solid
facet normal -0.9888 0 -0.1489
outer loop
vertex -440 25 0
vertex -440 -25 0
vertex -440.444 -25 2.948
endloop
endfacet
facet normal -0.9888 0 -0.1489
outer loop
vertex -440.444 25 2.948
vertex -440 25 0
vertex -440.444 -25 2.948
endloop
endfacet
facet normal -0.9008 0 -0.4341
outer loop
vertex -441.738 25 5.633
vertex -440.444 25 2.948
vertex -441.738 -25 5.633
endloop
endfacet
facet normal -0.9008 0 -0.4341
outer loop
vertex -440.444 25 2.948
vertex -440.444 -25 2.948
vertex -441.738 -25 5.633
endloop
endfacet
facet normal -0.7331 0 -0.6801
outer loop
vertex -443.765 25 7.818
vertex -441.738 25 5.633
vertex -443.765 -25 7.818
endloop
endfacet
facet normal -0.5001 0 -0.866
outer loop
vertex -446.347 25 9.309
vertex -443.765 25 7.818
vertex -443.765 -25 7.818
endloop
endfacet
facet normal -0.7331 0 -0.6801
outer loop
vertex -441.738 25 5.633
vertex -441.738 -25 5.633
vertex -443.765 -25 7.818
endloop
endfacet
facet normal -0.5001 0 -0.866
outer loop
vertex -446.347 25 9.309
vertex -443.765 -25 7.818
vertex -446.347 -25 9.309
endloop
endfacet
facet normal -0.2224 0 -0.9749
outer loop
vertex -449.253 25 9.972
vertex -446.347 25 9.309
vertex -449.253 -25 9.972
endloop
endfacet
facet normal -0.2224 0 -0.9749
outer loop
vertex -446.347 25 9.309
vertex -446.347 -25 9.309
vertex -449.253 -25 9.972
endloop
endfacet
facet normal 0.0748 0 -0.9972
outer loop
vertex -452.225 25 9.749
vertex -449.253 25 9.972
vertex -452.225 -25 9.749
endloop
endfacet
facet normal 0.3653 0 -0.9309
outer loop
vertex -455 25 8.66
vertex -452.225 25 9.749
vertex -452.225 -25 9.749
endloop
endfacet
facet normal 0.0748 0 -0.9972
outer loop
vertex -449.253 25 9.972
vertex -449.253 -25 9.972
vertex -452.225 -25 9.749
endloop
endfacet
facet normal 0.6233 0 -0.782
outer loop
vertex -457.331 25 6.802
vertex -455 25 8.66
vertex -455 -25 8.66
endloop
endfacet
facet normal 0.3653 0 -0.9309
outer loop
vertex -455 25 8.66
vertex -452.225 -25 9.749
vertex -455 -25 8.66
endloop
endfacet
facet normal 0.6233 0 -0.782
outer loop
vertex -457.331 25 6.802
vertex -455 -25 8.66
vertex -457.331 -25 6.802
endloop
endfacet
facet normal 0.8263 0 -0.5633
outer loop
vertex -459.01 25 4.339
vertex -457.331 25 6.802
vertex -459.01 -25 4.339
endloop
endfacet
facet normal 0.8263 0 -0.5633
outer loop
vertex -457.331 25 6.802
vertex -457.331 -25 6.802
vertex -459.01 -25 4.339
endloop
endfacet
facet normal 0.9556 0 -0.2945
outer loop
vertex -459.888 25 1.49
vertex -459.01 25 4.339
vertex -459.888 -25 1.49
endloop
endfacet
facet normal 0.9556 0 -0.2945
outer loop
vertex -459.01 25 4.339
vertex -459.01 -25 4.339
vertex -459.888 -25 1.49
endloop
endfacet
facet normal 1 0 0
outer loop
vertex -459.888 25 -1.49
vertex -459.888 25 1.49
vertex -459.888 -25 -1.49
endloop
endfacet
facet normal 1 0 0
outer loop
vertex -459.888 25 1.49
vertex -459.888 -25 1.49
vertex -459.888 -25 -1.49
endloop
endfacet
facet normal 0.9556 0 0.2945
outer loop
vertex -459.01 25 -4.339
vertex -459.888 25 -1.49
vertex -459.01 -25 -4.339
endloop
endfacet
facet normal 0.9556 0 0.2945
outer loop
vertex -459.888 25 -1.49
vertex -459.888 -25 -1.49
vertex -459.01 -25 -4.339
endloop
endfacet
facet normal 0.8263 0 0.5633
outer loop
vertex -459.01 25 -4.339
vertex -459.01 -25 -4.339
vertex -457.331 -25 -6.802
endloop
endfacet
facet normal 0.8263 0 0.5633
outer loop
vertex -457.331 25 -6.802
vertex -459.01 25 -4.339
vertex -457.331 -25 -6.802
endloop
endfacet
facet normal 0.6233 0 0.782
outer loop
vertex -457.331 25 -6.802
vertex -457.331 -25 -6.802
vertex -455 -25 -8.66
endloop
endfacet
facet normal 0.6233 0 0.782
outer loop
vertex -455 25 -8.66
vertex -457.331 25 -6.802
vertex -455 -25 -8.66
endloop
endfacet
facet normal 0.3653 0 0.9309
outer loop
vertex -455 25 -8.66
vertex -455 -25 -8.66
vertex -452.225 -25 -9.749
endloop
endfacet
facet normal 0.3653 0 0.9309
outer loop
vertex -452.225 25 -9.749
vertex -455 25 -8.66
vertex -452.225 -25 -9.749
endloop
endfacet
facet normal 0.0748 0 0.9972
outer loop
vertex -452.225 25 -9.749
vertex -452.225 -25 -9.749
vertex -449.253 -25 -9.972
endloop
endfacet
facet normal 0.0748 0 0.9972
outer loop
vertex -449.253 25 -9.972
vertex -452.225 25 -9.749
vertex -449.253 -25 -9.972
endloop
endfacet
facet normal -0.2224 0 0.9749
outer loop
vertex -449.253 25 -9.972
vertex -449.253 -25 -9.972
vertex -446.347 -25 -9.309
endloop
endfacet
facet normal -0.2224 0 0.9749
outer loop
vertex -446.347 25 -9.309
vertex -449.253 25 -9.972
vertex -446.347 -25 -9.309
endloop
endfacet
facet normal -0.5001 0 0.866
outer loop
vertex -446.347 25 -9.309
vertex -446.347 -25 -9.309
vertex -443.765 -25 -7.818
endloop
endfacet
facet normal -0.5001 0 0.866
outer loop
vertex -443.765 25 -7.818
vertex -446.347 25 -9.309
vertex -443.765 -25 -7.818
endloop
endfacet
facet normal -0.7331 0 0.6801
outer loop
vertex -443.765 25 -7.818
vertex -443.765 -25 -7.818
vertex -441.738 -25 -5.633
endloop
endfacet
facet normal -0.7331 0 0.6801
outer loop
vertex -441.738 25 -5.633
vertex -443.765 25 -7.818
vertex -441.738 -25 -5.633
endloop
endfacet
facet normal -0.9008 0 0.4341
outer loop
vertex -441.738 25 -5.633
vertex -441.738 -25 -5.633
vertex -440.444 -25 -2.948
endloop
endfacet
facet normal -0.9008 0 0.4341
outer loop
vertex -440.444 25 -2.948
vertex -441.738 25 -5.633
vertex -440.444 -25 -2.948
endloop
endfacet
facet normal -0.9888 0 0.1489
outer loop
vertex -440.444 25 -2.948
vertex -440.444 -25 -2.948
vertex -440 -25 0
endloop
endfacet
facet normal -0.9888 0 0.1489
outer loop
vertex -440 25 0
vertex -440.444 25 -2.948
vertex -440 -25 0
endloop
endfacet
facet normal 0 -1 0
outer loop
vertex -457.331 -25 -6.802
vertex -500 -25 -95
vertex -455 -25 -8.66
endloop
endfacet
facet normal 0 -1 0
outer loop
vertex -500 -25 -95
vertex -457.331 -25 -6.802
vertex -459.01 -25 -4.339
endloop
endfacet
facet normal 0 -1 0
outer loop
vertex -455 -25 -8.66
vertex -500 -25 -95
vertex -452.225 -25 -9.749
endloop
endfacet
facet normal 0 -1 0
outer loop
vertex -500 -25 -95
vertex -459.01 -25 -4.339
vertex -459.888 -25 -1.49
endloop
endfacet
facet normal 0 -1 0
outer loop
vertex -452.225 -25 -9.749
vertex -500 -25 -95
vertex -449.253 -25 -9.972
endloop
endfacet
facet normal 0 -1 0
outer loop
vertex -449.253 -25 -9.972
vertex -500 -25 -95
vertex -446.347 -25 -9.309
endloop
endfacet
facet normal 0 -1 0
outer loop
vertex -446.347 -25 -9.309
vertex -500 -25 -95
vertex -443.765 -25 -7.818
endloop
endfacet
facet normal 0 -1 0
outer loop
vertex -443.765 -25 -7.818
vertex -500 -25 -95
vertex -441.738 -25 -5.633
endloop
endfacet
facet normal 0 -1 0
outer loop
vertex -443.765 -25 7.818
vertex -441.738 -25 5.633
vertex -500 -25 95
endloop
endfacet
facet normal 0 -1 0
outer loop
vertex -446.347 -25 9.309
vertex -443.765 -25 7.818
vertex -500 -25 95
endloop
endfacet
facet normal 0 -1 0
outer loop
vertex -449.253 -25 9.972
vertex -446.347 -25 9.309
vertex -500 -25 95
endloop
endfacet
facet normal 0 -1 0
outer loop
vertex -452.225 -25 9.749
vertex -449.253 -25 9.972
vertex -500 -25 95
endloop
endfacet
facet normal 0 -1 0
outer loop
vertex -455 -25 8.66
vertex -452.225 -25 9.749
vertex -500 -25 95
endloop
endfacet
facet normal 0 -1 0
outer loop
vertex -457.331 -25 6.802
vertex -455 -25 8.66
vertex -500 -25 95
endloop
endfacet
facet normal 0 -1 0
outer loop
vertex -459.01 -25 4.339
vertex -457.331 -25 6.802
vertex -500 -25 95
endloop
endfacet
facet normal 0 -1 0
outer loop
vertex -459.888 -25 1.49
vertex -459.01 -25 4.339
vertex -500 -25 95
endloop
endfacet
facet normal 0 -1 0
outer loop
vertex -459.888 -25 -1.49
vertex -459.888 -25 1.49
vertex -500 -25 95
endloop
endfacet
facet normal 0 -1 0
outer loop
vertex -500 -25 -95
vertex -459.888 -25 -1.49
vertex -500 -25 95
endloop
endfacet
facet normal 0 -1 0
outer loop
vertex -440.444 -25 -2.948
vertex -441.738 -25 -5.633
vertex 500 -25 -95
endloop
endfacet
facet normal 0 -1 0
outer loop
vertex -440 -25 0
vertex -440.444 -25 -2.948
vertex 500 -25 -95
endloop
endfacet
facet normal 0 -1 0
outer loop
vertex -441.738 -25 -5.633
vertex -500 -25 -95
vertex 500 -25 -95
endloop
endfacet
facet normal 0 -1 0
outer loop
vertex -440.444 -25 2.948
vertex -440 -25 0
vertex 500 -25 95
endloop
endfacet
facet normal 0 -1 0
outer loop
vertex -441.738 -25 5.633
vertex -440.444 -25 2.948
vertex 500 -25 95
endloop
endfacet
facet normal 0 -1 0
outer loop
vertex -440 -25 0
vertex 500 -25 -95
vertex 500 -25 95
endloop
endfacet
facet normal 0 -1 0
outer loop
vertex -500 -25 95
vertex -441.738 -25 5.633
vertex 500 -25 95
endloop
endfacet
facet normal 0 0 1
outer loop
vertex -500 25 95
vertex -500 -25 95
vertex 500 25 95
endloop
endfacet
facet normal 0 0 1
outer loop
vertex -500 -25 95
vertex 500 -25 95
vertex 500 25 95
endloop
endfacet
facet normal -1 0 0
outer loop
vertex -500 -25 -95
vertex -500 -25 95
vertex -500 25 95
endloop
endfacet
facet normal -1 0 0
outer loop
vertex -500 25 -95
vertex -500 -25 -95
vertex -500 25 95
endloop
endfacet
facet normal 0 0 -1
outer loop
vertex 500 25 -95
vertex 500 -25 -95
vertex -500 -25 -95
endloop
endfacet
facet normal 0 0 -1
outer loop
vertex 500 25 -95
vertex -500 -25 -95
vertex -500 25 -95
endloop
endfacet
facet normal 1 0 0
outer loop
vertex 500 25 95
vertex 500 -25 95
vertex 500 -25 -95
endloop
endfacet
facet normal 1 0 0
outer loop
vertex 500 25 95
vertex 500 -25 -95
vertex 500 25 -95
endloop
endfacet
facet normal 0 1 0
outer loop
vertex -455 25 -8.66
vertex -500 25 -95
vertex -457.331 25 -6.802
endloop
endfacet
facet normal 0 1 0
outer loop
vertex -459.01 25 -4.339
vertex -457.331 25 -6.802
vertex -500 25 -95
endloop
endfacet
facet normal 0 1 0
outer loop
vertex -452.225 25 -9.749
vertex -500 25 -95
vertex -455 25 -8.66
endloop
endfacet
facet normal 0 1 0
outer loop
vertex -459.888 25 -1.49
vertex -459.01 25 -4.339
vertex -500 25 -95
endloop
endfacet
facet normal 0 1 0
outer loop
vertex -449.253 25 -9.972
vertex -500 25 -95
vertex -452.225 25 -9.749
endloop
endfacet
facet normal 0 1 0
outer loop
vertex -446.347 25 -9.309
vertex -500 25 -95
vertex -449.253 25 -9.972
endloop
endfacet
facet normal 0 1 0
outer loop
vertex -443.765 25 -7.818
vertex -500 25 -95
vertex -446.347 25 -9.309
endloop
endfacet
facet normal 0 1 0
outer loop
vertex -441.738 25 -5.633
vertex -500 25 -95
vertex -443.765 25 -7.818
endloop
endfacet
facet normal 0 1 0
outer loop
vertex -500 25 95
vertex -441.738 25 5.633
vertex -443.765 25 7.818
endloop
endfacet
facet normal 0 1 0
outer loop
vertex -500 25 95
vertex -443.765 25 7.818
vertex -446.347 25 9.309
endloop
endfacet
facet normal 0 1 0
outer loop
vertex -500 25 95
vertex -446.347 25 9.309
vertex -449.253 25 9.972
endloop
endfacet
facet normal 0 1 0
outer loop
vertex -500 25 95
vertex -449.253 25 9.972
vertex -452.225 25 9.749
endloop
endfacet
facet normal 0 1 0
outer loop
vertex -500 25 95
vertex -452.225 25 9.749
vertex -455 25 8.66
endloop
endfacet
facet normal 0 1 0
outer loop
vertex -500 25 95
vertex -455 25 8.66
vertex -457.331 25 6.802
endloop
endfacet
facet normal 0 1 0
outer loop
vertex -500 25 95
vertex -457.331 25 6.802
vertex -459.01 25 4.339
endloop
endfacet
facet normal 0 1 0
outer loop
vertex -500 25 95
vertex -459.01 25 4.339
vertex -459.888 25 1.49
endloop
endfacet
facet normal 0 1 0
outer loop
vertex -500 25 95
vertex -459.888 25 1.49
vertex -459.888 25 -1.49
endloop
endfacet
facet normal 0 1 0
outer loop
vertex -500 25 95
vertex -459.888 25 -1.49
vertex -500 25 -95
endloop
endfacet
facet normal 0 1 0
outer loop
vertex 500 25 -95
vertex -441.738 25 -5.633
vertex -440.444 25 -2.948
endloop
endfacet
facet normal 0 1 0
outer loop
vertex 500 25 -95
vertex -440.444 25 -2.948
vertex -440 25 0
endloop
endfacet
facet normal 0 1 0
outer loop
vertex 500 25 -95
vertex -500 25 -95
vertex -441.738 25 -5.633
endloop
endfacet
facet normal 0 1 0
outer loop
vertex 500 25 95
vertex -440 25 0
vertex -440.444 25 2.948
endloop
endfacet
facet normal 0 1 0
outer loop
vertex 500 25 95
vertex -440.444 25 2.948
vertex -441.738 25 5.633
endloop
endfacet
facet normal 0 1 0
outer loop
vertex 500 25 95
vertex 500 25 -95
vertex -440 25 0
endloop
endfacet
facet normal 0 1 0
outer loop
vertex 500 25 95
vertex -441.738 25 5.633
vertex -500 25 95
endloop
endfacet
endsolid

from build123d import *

# Parameters (mm, degrees)
F0_W     = 50
F0_H     = 190
F1_DEPTH = 500
F3_R     = 10
F4_DEPTH = 50.001


with BuildPart() as f1:
    # F0 (on Right) → F1 (new body, symmetric)
    with BuildSketch(Plane.YZ):
        Rectangle(F0_W, F0_H)
    extrude(amount=F1_DEPTH, both=True)

    # F3 (on face) → F4 (cut, through all)
    with BuildSketch(Plane.XZ.offset(25)):
        with Locations((-450, 0)):
            Circle(F3_R)
    extrude(amount=-F4_DEPTH, mode=Mode.SUBTRACT)


solid = f1.part
